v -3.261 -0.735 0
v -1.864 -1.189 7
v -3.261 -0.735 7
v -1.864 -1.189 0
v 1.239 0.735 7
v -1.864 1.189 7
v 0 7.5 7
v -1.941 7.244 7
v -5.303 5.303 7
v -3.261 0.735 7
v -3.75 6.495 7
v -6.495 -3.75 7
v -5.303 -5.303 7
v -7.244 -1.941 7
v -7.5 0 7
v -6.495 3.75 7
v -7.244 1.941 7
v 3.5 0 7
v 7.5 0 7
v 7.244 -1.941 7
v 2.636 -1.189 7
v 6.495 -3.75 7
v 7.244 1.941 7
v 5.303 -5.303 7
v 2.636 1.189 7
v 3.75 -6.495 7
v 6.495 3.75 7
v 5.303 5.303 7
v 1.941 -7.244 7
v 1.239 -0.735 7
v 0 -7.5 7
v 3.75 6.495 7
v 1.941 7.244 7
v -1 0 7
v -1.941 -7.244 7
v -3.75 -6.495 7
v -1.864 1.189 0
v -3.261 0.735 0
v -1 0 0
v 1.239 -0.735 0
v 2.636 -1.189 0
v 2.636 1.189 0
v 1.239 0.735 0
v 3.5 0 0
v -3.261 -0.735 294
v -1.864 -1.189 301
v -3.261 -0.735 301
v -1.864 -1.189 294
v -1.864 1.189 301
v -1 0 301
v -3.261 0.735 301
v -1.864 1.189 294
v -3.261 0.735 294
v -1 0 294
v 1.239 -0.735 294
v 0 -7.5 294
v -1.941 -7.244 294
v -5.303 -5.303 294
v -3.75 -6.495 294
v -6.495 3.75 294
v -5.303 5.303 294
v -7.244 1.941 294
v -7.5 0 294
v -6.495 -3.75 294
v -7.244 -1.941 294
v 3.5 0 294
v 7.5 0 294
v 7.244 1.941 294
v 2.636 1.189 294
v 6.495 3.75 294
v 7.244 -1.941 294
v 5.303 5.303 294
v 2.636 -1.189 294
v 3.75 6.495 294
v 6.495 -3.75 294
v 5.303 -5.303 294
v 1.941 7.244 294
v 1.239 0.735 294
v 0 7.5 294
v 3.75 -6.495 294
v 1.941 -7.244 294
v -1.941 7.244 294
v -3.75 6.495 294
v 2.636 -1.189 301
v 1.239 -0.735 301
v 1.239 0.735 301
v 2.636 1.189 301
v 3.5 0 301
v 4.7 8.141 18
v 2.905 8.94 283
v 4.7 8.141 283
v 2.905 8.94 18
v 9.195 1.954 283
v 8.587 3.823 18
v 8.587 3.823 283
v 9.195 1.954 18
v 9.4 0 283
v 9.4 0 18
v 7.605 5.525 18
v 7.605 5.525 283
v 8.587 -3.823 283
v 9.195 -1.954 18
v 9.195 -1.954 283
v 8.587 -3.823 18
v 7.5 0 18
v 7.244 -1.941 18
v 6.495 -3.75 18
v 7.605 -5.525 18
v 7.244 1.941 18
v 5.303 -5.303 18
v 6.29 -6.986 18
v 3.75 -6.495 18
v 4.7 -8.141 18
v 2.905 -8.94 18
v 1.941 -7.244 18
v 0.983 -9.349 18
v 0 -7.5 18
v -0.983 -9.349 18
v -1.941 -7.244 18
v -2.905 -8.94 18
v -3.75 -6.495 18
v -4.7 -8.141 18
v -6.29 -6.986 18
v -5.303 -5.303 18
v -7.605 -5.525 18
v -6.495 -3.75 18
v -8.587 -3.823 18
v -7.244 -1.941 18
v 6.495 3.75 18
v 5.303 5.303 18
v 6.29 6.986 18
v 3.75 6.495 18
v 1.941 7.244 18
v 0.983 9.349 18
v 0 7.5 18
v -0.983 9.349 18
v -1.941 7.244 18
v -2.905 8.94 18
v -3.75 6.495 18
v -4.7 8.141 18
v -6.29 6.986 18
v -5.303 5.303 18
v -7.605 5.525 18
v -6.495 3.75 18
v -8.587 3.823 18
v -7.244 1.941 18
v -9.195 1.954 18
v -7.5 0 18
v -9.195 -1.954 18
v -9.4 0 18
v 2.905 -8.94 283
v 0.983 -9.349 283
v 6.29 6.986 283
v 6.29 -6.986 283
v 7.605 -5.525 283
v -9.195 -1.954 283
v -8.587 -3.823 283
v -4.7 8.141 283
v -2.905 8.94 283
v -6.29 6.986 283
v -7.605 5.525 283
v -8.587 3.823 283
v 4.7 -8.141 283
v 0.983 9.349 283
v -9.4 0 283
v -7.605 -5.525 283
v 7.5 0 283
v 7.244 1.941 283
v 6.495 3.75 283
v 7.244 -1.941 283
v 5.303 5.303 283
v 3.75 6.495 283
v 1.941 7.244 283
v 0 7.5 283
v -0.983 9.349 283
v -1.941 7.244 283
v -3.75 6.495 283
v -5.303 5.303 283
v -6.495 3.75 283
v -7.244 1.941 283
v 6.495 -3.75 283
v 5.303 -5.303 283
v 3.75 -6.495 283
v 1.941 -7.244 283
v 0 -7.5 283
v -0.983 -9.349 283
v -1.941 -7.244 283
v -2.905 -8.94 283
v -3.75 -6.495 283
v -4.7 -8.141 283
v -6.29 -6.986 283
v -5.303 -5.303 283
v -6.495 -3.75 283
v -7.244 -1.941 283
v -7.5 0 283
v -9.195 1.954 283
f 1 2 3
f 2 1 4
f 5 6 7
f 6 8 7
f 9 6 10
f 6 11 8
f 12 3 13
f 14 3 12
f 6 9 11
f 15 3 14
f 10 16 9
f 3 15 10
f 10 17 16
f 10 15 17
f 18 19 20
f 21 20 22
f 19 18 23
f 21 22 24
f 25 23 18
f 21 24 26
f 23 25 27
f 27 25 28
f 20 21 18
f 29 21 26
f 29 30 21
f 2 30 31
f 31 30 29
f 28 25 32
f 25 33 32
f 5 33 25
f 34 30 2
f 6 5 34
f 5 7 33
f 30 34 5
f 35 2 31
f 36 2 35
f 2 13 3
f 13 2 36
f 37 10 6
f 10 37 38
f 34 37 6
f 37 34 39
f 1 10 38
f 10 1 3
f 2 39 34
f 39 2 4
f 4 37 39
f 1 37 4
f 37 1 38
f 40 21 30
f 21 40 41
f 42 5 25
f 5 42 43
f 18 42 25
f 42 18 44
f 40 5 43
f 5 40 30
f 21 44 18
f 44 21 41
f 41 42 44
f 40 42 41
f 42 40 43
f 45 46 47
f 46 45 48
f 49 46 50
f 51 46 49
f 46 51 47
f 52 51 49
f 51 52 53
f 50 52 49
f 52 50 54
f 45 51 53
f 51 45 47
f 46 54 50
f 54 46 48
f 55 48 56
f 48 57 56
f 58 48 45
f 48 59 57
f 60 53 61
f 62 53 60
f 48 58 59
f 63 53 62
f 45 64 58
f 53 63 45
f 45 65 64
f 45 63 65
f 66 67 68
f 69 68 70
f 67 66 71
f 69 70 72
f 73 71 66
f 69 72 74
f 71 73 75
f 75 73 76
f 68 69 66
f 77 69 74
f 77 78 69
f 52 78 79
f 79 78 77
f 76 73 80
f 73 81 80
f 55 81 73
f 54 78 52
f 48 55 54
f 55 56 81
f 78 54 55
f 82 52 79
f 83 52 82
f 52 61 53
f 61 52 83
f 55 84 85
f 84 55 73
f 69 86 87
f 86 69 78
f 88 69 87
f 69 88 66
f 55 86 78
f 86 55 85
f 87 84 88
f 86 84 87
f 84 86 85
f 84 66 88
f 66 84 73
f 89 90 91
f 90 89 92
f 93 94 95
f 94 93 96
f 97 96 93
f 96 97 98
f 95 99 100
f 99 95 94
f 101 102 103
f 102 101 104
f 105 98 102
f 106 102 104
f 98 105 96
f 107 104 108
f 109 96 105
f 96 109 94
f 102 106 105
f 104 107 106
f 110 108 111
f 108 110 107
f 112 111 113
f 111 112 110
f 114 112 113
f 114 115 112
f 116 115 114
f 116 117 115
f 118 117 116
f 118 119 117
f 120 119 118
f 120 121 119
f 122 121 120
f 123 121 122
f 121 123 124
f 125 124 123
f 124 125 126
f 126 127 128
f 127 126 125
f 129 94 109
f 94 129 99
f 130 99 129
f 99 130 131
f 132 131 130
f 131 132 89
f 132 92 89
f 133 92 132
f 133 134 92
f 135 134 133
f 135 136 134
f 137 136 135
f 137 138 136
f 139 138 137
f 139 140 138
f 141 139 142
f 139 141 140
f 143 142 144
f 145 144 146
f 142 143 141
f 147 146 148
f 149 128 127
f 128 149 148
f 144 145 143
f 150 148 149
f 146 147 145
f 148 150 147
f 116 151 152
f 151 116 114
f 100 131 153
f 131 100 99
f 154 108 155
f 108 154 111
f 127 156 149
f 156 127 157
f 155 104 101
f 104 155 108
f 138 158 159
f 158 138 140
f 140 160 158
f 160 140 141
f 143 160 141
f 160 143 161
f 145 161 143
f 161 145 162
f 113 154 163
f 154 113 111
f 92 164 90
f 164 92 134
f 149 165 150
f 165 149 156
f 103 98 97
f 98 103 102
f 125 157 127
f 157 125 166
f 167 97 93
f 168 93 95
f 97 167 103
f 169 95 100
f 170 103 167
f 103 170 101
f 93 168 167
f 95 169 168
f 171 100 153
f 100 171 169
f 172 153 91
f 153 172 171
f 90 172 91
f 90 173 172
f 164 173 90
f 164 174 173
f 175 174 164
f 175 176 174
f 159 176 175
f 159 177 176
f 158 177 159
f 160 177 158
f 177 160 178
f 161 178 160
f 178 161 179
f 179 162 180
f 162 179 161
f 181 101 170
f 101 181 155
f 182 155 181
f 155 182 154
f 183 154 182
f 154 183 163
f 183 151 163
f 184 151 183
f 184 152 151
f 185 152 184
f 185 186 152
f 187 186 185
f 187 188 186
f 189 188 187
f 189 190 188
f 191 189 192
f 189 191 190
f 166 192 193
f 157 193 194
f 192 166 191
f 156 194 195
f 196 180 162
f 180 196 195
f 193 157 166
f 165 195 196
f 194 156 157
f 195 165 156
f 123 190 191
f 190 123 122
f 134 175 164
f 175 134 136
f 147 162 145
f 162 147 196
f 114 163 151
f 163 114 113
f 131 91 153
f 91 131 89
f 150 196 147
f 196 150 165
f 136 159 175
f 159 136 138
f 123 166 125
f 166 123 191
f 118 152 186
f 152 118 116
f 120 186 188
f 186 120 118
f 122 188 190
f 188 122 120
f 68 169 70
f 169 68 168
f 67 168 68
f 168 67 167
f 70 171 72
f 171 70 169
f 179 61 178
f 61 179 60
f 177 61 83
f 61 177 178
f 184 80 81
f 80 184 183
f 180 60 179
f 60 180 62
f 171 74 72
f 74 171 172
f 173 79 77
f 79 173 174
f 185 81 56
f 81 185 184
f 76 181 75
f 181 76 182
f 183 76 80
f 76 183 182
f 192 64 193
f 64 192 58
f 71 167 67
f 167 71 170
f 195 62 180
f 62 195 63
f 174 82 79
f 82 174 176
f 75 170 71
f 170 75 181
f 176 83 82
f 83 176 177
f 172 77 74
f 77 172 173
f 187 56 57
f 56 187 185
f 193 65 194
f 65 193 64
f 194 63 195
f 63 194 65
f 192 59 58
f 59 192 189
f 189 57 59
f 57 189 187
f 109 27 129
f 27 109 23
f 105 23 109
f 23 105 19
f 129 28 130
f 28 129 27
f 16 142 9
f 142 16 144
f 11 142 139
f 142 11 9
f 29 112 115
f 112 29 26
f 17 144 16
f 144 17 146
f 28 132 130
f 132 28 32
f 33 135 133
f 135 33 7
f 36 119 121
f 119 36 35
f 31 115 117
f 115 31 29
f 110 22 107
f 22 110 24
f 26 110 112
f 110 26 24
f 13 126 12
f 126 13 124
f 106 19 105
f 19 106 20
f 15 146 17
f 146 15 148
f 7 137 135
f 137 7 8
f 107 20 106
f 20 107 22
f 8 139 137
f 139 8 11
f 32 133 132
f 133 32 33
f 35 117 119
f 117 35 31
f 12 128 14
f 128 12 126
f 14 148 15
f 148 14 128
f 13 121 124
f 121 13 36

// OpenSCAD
module tubo_germicida() {
    LONGITUD_VIDRIO = 265;
    DIAMETRO_VIDRIO = 18.8;
    LONGITUD_METAL = 11;
    DIAMETRO_METAL = 15;
    LONGITUD_PIN = 7;
    DIAMETRO_PIN = 2.5;
    SEPARACION_PIN = 4.5;
    module pin() {
        cylinder(h=LONGITUD_PIN, d=DIAMETRO_PIN);
    }
    module metalsito() {
        color([1,1,1]*.8)
        cylinder(h=LONGITUD_METAL, d=DIAMETRO_METAL);
    }
    module tubo_de_vidrio() {
        color([1,1,1], alpha=.2)
        cylinder(h=LONGITUD_VIDRIO, d=DIAMETRO_VIDRIO);
    }
    
    translate([-SEPARACION_PIN/2,0,0])
        pin();
    translate([SEPARACION_PIN/2,0,0])
        pin();
    translate([-SEPARACION_PIN/2,0,2*LONGITUD_METAL+LONGITUD_VIDRIO+LONGITUD_PIN])
        pin();
    translate([SEPARACION_PIN/2,0,2*LONGITUD_METAL+LONGITUD_VIDRIO+LONGITUD_PIN])
        pin();
    
    translate([0,0,LONGITUD_METAL+LONGITUD_PIN])
        tubo_de_vidrio();

    translate([0,0,LONGITUD_METAL+LONGITUD_VIDRIO+LONGITUD_PIN])
        metalsito();
    translate([0,0,LONGITUD_PIN])
        metalsito();
}

tubo_germicida();
